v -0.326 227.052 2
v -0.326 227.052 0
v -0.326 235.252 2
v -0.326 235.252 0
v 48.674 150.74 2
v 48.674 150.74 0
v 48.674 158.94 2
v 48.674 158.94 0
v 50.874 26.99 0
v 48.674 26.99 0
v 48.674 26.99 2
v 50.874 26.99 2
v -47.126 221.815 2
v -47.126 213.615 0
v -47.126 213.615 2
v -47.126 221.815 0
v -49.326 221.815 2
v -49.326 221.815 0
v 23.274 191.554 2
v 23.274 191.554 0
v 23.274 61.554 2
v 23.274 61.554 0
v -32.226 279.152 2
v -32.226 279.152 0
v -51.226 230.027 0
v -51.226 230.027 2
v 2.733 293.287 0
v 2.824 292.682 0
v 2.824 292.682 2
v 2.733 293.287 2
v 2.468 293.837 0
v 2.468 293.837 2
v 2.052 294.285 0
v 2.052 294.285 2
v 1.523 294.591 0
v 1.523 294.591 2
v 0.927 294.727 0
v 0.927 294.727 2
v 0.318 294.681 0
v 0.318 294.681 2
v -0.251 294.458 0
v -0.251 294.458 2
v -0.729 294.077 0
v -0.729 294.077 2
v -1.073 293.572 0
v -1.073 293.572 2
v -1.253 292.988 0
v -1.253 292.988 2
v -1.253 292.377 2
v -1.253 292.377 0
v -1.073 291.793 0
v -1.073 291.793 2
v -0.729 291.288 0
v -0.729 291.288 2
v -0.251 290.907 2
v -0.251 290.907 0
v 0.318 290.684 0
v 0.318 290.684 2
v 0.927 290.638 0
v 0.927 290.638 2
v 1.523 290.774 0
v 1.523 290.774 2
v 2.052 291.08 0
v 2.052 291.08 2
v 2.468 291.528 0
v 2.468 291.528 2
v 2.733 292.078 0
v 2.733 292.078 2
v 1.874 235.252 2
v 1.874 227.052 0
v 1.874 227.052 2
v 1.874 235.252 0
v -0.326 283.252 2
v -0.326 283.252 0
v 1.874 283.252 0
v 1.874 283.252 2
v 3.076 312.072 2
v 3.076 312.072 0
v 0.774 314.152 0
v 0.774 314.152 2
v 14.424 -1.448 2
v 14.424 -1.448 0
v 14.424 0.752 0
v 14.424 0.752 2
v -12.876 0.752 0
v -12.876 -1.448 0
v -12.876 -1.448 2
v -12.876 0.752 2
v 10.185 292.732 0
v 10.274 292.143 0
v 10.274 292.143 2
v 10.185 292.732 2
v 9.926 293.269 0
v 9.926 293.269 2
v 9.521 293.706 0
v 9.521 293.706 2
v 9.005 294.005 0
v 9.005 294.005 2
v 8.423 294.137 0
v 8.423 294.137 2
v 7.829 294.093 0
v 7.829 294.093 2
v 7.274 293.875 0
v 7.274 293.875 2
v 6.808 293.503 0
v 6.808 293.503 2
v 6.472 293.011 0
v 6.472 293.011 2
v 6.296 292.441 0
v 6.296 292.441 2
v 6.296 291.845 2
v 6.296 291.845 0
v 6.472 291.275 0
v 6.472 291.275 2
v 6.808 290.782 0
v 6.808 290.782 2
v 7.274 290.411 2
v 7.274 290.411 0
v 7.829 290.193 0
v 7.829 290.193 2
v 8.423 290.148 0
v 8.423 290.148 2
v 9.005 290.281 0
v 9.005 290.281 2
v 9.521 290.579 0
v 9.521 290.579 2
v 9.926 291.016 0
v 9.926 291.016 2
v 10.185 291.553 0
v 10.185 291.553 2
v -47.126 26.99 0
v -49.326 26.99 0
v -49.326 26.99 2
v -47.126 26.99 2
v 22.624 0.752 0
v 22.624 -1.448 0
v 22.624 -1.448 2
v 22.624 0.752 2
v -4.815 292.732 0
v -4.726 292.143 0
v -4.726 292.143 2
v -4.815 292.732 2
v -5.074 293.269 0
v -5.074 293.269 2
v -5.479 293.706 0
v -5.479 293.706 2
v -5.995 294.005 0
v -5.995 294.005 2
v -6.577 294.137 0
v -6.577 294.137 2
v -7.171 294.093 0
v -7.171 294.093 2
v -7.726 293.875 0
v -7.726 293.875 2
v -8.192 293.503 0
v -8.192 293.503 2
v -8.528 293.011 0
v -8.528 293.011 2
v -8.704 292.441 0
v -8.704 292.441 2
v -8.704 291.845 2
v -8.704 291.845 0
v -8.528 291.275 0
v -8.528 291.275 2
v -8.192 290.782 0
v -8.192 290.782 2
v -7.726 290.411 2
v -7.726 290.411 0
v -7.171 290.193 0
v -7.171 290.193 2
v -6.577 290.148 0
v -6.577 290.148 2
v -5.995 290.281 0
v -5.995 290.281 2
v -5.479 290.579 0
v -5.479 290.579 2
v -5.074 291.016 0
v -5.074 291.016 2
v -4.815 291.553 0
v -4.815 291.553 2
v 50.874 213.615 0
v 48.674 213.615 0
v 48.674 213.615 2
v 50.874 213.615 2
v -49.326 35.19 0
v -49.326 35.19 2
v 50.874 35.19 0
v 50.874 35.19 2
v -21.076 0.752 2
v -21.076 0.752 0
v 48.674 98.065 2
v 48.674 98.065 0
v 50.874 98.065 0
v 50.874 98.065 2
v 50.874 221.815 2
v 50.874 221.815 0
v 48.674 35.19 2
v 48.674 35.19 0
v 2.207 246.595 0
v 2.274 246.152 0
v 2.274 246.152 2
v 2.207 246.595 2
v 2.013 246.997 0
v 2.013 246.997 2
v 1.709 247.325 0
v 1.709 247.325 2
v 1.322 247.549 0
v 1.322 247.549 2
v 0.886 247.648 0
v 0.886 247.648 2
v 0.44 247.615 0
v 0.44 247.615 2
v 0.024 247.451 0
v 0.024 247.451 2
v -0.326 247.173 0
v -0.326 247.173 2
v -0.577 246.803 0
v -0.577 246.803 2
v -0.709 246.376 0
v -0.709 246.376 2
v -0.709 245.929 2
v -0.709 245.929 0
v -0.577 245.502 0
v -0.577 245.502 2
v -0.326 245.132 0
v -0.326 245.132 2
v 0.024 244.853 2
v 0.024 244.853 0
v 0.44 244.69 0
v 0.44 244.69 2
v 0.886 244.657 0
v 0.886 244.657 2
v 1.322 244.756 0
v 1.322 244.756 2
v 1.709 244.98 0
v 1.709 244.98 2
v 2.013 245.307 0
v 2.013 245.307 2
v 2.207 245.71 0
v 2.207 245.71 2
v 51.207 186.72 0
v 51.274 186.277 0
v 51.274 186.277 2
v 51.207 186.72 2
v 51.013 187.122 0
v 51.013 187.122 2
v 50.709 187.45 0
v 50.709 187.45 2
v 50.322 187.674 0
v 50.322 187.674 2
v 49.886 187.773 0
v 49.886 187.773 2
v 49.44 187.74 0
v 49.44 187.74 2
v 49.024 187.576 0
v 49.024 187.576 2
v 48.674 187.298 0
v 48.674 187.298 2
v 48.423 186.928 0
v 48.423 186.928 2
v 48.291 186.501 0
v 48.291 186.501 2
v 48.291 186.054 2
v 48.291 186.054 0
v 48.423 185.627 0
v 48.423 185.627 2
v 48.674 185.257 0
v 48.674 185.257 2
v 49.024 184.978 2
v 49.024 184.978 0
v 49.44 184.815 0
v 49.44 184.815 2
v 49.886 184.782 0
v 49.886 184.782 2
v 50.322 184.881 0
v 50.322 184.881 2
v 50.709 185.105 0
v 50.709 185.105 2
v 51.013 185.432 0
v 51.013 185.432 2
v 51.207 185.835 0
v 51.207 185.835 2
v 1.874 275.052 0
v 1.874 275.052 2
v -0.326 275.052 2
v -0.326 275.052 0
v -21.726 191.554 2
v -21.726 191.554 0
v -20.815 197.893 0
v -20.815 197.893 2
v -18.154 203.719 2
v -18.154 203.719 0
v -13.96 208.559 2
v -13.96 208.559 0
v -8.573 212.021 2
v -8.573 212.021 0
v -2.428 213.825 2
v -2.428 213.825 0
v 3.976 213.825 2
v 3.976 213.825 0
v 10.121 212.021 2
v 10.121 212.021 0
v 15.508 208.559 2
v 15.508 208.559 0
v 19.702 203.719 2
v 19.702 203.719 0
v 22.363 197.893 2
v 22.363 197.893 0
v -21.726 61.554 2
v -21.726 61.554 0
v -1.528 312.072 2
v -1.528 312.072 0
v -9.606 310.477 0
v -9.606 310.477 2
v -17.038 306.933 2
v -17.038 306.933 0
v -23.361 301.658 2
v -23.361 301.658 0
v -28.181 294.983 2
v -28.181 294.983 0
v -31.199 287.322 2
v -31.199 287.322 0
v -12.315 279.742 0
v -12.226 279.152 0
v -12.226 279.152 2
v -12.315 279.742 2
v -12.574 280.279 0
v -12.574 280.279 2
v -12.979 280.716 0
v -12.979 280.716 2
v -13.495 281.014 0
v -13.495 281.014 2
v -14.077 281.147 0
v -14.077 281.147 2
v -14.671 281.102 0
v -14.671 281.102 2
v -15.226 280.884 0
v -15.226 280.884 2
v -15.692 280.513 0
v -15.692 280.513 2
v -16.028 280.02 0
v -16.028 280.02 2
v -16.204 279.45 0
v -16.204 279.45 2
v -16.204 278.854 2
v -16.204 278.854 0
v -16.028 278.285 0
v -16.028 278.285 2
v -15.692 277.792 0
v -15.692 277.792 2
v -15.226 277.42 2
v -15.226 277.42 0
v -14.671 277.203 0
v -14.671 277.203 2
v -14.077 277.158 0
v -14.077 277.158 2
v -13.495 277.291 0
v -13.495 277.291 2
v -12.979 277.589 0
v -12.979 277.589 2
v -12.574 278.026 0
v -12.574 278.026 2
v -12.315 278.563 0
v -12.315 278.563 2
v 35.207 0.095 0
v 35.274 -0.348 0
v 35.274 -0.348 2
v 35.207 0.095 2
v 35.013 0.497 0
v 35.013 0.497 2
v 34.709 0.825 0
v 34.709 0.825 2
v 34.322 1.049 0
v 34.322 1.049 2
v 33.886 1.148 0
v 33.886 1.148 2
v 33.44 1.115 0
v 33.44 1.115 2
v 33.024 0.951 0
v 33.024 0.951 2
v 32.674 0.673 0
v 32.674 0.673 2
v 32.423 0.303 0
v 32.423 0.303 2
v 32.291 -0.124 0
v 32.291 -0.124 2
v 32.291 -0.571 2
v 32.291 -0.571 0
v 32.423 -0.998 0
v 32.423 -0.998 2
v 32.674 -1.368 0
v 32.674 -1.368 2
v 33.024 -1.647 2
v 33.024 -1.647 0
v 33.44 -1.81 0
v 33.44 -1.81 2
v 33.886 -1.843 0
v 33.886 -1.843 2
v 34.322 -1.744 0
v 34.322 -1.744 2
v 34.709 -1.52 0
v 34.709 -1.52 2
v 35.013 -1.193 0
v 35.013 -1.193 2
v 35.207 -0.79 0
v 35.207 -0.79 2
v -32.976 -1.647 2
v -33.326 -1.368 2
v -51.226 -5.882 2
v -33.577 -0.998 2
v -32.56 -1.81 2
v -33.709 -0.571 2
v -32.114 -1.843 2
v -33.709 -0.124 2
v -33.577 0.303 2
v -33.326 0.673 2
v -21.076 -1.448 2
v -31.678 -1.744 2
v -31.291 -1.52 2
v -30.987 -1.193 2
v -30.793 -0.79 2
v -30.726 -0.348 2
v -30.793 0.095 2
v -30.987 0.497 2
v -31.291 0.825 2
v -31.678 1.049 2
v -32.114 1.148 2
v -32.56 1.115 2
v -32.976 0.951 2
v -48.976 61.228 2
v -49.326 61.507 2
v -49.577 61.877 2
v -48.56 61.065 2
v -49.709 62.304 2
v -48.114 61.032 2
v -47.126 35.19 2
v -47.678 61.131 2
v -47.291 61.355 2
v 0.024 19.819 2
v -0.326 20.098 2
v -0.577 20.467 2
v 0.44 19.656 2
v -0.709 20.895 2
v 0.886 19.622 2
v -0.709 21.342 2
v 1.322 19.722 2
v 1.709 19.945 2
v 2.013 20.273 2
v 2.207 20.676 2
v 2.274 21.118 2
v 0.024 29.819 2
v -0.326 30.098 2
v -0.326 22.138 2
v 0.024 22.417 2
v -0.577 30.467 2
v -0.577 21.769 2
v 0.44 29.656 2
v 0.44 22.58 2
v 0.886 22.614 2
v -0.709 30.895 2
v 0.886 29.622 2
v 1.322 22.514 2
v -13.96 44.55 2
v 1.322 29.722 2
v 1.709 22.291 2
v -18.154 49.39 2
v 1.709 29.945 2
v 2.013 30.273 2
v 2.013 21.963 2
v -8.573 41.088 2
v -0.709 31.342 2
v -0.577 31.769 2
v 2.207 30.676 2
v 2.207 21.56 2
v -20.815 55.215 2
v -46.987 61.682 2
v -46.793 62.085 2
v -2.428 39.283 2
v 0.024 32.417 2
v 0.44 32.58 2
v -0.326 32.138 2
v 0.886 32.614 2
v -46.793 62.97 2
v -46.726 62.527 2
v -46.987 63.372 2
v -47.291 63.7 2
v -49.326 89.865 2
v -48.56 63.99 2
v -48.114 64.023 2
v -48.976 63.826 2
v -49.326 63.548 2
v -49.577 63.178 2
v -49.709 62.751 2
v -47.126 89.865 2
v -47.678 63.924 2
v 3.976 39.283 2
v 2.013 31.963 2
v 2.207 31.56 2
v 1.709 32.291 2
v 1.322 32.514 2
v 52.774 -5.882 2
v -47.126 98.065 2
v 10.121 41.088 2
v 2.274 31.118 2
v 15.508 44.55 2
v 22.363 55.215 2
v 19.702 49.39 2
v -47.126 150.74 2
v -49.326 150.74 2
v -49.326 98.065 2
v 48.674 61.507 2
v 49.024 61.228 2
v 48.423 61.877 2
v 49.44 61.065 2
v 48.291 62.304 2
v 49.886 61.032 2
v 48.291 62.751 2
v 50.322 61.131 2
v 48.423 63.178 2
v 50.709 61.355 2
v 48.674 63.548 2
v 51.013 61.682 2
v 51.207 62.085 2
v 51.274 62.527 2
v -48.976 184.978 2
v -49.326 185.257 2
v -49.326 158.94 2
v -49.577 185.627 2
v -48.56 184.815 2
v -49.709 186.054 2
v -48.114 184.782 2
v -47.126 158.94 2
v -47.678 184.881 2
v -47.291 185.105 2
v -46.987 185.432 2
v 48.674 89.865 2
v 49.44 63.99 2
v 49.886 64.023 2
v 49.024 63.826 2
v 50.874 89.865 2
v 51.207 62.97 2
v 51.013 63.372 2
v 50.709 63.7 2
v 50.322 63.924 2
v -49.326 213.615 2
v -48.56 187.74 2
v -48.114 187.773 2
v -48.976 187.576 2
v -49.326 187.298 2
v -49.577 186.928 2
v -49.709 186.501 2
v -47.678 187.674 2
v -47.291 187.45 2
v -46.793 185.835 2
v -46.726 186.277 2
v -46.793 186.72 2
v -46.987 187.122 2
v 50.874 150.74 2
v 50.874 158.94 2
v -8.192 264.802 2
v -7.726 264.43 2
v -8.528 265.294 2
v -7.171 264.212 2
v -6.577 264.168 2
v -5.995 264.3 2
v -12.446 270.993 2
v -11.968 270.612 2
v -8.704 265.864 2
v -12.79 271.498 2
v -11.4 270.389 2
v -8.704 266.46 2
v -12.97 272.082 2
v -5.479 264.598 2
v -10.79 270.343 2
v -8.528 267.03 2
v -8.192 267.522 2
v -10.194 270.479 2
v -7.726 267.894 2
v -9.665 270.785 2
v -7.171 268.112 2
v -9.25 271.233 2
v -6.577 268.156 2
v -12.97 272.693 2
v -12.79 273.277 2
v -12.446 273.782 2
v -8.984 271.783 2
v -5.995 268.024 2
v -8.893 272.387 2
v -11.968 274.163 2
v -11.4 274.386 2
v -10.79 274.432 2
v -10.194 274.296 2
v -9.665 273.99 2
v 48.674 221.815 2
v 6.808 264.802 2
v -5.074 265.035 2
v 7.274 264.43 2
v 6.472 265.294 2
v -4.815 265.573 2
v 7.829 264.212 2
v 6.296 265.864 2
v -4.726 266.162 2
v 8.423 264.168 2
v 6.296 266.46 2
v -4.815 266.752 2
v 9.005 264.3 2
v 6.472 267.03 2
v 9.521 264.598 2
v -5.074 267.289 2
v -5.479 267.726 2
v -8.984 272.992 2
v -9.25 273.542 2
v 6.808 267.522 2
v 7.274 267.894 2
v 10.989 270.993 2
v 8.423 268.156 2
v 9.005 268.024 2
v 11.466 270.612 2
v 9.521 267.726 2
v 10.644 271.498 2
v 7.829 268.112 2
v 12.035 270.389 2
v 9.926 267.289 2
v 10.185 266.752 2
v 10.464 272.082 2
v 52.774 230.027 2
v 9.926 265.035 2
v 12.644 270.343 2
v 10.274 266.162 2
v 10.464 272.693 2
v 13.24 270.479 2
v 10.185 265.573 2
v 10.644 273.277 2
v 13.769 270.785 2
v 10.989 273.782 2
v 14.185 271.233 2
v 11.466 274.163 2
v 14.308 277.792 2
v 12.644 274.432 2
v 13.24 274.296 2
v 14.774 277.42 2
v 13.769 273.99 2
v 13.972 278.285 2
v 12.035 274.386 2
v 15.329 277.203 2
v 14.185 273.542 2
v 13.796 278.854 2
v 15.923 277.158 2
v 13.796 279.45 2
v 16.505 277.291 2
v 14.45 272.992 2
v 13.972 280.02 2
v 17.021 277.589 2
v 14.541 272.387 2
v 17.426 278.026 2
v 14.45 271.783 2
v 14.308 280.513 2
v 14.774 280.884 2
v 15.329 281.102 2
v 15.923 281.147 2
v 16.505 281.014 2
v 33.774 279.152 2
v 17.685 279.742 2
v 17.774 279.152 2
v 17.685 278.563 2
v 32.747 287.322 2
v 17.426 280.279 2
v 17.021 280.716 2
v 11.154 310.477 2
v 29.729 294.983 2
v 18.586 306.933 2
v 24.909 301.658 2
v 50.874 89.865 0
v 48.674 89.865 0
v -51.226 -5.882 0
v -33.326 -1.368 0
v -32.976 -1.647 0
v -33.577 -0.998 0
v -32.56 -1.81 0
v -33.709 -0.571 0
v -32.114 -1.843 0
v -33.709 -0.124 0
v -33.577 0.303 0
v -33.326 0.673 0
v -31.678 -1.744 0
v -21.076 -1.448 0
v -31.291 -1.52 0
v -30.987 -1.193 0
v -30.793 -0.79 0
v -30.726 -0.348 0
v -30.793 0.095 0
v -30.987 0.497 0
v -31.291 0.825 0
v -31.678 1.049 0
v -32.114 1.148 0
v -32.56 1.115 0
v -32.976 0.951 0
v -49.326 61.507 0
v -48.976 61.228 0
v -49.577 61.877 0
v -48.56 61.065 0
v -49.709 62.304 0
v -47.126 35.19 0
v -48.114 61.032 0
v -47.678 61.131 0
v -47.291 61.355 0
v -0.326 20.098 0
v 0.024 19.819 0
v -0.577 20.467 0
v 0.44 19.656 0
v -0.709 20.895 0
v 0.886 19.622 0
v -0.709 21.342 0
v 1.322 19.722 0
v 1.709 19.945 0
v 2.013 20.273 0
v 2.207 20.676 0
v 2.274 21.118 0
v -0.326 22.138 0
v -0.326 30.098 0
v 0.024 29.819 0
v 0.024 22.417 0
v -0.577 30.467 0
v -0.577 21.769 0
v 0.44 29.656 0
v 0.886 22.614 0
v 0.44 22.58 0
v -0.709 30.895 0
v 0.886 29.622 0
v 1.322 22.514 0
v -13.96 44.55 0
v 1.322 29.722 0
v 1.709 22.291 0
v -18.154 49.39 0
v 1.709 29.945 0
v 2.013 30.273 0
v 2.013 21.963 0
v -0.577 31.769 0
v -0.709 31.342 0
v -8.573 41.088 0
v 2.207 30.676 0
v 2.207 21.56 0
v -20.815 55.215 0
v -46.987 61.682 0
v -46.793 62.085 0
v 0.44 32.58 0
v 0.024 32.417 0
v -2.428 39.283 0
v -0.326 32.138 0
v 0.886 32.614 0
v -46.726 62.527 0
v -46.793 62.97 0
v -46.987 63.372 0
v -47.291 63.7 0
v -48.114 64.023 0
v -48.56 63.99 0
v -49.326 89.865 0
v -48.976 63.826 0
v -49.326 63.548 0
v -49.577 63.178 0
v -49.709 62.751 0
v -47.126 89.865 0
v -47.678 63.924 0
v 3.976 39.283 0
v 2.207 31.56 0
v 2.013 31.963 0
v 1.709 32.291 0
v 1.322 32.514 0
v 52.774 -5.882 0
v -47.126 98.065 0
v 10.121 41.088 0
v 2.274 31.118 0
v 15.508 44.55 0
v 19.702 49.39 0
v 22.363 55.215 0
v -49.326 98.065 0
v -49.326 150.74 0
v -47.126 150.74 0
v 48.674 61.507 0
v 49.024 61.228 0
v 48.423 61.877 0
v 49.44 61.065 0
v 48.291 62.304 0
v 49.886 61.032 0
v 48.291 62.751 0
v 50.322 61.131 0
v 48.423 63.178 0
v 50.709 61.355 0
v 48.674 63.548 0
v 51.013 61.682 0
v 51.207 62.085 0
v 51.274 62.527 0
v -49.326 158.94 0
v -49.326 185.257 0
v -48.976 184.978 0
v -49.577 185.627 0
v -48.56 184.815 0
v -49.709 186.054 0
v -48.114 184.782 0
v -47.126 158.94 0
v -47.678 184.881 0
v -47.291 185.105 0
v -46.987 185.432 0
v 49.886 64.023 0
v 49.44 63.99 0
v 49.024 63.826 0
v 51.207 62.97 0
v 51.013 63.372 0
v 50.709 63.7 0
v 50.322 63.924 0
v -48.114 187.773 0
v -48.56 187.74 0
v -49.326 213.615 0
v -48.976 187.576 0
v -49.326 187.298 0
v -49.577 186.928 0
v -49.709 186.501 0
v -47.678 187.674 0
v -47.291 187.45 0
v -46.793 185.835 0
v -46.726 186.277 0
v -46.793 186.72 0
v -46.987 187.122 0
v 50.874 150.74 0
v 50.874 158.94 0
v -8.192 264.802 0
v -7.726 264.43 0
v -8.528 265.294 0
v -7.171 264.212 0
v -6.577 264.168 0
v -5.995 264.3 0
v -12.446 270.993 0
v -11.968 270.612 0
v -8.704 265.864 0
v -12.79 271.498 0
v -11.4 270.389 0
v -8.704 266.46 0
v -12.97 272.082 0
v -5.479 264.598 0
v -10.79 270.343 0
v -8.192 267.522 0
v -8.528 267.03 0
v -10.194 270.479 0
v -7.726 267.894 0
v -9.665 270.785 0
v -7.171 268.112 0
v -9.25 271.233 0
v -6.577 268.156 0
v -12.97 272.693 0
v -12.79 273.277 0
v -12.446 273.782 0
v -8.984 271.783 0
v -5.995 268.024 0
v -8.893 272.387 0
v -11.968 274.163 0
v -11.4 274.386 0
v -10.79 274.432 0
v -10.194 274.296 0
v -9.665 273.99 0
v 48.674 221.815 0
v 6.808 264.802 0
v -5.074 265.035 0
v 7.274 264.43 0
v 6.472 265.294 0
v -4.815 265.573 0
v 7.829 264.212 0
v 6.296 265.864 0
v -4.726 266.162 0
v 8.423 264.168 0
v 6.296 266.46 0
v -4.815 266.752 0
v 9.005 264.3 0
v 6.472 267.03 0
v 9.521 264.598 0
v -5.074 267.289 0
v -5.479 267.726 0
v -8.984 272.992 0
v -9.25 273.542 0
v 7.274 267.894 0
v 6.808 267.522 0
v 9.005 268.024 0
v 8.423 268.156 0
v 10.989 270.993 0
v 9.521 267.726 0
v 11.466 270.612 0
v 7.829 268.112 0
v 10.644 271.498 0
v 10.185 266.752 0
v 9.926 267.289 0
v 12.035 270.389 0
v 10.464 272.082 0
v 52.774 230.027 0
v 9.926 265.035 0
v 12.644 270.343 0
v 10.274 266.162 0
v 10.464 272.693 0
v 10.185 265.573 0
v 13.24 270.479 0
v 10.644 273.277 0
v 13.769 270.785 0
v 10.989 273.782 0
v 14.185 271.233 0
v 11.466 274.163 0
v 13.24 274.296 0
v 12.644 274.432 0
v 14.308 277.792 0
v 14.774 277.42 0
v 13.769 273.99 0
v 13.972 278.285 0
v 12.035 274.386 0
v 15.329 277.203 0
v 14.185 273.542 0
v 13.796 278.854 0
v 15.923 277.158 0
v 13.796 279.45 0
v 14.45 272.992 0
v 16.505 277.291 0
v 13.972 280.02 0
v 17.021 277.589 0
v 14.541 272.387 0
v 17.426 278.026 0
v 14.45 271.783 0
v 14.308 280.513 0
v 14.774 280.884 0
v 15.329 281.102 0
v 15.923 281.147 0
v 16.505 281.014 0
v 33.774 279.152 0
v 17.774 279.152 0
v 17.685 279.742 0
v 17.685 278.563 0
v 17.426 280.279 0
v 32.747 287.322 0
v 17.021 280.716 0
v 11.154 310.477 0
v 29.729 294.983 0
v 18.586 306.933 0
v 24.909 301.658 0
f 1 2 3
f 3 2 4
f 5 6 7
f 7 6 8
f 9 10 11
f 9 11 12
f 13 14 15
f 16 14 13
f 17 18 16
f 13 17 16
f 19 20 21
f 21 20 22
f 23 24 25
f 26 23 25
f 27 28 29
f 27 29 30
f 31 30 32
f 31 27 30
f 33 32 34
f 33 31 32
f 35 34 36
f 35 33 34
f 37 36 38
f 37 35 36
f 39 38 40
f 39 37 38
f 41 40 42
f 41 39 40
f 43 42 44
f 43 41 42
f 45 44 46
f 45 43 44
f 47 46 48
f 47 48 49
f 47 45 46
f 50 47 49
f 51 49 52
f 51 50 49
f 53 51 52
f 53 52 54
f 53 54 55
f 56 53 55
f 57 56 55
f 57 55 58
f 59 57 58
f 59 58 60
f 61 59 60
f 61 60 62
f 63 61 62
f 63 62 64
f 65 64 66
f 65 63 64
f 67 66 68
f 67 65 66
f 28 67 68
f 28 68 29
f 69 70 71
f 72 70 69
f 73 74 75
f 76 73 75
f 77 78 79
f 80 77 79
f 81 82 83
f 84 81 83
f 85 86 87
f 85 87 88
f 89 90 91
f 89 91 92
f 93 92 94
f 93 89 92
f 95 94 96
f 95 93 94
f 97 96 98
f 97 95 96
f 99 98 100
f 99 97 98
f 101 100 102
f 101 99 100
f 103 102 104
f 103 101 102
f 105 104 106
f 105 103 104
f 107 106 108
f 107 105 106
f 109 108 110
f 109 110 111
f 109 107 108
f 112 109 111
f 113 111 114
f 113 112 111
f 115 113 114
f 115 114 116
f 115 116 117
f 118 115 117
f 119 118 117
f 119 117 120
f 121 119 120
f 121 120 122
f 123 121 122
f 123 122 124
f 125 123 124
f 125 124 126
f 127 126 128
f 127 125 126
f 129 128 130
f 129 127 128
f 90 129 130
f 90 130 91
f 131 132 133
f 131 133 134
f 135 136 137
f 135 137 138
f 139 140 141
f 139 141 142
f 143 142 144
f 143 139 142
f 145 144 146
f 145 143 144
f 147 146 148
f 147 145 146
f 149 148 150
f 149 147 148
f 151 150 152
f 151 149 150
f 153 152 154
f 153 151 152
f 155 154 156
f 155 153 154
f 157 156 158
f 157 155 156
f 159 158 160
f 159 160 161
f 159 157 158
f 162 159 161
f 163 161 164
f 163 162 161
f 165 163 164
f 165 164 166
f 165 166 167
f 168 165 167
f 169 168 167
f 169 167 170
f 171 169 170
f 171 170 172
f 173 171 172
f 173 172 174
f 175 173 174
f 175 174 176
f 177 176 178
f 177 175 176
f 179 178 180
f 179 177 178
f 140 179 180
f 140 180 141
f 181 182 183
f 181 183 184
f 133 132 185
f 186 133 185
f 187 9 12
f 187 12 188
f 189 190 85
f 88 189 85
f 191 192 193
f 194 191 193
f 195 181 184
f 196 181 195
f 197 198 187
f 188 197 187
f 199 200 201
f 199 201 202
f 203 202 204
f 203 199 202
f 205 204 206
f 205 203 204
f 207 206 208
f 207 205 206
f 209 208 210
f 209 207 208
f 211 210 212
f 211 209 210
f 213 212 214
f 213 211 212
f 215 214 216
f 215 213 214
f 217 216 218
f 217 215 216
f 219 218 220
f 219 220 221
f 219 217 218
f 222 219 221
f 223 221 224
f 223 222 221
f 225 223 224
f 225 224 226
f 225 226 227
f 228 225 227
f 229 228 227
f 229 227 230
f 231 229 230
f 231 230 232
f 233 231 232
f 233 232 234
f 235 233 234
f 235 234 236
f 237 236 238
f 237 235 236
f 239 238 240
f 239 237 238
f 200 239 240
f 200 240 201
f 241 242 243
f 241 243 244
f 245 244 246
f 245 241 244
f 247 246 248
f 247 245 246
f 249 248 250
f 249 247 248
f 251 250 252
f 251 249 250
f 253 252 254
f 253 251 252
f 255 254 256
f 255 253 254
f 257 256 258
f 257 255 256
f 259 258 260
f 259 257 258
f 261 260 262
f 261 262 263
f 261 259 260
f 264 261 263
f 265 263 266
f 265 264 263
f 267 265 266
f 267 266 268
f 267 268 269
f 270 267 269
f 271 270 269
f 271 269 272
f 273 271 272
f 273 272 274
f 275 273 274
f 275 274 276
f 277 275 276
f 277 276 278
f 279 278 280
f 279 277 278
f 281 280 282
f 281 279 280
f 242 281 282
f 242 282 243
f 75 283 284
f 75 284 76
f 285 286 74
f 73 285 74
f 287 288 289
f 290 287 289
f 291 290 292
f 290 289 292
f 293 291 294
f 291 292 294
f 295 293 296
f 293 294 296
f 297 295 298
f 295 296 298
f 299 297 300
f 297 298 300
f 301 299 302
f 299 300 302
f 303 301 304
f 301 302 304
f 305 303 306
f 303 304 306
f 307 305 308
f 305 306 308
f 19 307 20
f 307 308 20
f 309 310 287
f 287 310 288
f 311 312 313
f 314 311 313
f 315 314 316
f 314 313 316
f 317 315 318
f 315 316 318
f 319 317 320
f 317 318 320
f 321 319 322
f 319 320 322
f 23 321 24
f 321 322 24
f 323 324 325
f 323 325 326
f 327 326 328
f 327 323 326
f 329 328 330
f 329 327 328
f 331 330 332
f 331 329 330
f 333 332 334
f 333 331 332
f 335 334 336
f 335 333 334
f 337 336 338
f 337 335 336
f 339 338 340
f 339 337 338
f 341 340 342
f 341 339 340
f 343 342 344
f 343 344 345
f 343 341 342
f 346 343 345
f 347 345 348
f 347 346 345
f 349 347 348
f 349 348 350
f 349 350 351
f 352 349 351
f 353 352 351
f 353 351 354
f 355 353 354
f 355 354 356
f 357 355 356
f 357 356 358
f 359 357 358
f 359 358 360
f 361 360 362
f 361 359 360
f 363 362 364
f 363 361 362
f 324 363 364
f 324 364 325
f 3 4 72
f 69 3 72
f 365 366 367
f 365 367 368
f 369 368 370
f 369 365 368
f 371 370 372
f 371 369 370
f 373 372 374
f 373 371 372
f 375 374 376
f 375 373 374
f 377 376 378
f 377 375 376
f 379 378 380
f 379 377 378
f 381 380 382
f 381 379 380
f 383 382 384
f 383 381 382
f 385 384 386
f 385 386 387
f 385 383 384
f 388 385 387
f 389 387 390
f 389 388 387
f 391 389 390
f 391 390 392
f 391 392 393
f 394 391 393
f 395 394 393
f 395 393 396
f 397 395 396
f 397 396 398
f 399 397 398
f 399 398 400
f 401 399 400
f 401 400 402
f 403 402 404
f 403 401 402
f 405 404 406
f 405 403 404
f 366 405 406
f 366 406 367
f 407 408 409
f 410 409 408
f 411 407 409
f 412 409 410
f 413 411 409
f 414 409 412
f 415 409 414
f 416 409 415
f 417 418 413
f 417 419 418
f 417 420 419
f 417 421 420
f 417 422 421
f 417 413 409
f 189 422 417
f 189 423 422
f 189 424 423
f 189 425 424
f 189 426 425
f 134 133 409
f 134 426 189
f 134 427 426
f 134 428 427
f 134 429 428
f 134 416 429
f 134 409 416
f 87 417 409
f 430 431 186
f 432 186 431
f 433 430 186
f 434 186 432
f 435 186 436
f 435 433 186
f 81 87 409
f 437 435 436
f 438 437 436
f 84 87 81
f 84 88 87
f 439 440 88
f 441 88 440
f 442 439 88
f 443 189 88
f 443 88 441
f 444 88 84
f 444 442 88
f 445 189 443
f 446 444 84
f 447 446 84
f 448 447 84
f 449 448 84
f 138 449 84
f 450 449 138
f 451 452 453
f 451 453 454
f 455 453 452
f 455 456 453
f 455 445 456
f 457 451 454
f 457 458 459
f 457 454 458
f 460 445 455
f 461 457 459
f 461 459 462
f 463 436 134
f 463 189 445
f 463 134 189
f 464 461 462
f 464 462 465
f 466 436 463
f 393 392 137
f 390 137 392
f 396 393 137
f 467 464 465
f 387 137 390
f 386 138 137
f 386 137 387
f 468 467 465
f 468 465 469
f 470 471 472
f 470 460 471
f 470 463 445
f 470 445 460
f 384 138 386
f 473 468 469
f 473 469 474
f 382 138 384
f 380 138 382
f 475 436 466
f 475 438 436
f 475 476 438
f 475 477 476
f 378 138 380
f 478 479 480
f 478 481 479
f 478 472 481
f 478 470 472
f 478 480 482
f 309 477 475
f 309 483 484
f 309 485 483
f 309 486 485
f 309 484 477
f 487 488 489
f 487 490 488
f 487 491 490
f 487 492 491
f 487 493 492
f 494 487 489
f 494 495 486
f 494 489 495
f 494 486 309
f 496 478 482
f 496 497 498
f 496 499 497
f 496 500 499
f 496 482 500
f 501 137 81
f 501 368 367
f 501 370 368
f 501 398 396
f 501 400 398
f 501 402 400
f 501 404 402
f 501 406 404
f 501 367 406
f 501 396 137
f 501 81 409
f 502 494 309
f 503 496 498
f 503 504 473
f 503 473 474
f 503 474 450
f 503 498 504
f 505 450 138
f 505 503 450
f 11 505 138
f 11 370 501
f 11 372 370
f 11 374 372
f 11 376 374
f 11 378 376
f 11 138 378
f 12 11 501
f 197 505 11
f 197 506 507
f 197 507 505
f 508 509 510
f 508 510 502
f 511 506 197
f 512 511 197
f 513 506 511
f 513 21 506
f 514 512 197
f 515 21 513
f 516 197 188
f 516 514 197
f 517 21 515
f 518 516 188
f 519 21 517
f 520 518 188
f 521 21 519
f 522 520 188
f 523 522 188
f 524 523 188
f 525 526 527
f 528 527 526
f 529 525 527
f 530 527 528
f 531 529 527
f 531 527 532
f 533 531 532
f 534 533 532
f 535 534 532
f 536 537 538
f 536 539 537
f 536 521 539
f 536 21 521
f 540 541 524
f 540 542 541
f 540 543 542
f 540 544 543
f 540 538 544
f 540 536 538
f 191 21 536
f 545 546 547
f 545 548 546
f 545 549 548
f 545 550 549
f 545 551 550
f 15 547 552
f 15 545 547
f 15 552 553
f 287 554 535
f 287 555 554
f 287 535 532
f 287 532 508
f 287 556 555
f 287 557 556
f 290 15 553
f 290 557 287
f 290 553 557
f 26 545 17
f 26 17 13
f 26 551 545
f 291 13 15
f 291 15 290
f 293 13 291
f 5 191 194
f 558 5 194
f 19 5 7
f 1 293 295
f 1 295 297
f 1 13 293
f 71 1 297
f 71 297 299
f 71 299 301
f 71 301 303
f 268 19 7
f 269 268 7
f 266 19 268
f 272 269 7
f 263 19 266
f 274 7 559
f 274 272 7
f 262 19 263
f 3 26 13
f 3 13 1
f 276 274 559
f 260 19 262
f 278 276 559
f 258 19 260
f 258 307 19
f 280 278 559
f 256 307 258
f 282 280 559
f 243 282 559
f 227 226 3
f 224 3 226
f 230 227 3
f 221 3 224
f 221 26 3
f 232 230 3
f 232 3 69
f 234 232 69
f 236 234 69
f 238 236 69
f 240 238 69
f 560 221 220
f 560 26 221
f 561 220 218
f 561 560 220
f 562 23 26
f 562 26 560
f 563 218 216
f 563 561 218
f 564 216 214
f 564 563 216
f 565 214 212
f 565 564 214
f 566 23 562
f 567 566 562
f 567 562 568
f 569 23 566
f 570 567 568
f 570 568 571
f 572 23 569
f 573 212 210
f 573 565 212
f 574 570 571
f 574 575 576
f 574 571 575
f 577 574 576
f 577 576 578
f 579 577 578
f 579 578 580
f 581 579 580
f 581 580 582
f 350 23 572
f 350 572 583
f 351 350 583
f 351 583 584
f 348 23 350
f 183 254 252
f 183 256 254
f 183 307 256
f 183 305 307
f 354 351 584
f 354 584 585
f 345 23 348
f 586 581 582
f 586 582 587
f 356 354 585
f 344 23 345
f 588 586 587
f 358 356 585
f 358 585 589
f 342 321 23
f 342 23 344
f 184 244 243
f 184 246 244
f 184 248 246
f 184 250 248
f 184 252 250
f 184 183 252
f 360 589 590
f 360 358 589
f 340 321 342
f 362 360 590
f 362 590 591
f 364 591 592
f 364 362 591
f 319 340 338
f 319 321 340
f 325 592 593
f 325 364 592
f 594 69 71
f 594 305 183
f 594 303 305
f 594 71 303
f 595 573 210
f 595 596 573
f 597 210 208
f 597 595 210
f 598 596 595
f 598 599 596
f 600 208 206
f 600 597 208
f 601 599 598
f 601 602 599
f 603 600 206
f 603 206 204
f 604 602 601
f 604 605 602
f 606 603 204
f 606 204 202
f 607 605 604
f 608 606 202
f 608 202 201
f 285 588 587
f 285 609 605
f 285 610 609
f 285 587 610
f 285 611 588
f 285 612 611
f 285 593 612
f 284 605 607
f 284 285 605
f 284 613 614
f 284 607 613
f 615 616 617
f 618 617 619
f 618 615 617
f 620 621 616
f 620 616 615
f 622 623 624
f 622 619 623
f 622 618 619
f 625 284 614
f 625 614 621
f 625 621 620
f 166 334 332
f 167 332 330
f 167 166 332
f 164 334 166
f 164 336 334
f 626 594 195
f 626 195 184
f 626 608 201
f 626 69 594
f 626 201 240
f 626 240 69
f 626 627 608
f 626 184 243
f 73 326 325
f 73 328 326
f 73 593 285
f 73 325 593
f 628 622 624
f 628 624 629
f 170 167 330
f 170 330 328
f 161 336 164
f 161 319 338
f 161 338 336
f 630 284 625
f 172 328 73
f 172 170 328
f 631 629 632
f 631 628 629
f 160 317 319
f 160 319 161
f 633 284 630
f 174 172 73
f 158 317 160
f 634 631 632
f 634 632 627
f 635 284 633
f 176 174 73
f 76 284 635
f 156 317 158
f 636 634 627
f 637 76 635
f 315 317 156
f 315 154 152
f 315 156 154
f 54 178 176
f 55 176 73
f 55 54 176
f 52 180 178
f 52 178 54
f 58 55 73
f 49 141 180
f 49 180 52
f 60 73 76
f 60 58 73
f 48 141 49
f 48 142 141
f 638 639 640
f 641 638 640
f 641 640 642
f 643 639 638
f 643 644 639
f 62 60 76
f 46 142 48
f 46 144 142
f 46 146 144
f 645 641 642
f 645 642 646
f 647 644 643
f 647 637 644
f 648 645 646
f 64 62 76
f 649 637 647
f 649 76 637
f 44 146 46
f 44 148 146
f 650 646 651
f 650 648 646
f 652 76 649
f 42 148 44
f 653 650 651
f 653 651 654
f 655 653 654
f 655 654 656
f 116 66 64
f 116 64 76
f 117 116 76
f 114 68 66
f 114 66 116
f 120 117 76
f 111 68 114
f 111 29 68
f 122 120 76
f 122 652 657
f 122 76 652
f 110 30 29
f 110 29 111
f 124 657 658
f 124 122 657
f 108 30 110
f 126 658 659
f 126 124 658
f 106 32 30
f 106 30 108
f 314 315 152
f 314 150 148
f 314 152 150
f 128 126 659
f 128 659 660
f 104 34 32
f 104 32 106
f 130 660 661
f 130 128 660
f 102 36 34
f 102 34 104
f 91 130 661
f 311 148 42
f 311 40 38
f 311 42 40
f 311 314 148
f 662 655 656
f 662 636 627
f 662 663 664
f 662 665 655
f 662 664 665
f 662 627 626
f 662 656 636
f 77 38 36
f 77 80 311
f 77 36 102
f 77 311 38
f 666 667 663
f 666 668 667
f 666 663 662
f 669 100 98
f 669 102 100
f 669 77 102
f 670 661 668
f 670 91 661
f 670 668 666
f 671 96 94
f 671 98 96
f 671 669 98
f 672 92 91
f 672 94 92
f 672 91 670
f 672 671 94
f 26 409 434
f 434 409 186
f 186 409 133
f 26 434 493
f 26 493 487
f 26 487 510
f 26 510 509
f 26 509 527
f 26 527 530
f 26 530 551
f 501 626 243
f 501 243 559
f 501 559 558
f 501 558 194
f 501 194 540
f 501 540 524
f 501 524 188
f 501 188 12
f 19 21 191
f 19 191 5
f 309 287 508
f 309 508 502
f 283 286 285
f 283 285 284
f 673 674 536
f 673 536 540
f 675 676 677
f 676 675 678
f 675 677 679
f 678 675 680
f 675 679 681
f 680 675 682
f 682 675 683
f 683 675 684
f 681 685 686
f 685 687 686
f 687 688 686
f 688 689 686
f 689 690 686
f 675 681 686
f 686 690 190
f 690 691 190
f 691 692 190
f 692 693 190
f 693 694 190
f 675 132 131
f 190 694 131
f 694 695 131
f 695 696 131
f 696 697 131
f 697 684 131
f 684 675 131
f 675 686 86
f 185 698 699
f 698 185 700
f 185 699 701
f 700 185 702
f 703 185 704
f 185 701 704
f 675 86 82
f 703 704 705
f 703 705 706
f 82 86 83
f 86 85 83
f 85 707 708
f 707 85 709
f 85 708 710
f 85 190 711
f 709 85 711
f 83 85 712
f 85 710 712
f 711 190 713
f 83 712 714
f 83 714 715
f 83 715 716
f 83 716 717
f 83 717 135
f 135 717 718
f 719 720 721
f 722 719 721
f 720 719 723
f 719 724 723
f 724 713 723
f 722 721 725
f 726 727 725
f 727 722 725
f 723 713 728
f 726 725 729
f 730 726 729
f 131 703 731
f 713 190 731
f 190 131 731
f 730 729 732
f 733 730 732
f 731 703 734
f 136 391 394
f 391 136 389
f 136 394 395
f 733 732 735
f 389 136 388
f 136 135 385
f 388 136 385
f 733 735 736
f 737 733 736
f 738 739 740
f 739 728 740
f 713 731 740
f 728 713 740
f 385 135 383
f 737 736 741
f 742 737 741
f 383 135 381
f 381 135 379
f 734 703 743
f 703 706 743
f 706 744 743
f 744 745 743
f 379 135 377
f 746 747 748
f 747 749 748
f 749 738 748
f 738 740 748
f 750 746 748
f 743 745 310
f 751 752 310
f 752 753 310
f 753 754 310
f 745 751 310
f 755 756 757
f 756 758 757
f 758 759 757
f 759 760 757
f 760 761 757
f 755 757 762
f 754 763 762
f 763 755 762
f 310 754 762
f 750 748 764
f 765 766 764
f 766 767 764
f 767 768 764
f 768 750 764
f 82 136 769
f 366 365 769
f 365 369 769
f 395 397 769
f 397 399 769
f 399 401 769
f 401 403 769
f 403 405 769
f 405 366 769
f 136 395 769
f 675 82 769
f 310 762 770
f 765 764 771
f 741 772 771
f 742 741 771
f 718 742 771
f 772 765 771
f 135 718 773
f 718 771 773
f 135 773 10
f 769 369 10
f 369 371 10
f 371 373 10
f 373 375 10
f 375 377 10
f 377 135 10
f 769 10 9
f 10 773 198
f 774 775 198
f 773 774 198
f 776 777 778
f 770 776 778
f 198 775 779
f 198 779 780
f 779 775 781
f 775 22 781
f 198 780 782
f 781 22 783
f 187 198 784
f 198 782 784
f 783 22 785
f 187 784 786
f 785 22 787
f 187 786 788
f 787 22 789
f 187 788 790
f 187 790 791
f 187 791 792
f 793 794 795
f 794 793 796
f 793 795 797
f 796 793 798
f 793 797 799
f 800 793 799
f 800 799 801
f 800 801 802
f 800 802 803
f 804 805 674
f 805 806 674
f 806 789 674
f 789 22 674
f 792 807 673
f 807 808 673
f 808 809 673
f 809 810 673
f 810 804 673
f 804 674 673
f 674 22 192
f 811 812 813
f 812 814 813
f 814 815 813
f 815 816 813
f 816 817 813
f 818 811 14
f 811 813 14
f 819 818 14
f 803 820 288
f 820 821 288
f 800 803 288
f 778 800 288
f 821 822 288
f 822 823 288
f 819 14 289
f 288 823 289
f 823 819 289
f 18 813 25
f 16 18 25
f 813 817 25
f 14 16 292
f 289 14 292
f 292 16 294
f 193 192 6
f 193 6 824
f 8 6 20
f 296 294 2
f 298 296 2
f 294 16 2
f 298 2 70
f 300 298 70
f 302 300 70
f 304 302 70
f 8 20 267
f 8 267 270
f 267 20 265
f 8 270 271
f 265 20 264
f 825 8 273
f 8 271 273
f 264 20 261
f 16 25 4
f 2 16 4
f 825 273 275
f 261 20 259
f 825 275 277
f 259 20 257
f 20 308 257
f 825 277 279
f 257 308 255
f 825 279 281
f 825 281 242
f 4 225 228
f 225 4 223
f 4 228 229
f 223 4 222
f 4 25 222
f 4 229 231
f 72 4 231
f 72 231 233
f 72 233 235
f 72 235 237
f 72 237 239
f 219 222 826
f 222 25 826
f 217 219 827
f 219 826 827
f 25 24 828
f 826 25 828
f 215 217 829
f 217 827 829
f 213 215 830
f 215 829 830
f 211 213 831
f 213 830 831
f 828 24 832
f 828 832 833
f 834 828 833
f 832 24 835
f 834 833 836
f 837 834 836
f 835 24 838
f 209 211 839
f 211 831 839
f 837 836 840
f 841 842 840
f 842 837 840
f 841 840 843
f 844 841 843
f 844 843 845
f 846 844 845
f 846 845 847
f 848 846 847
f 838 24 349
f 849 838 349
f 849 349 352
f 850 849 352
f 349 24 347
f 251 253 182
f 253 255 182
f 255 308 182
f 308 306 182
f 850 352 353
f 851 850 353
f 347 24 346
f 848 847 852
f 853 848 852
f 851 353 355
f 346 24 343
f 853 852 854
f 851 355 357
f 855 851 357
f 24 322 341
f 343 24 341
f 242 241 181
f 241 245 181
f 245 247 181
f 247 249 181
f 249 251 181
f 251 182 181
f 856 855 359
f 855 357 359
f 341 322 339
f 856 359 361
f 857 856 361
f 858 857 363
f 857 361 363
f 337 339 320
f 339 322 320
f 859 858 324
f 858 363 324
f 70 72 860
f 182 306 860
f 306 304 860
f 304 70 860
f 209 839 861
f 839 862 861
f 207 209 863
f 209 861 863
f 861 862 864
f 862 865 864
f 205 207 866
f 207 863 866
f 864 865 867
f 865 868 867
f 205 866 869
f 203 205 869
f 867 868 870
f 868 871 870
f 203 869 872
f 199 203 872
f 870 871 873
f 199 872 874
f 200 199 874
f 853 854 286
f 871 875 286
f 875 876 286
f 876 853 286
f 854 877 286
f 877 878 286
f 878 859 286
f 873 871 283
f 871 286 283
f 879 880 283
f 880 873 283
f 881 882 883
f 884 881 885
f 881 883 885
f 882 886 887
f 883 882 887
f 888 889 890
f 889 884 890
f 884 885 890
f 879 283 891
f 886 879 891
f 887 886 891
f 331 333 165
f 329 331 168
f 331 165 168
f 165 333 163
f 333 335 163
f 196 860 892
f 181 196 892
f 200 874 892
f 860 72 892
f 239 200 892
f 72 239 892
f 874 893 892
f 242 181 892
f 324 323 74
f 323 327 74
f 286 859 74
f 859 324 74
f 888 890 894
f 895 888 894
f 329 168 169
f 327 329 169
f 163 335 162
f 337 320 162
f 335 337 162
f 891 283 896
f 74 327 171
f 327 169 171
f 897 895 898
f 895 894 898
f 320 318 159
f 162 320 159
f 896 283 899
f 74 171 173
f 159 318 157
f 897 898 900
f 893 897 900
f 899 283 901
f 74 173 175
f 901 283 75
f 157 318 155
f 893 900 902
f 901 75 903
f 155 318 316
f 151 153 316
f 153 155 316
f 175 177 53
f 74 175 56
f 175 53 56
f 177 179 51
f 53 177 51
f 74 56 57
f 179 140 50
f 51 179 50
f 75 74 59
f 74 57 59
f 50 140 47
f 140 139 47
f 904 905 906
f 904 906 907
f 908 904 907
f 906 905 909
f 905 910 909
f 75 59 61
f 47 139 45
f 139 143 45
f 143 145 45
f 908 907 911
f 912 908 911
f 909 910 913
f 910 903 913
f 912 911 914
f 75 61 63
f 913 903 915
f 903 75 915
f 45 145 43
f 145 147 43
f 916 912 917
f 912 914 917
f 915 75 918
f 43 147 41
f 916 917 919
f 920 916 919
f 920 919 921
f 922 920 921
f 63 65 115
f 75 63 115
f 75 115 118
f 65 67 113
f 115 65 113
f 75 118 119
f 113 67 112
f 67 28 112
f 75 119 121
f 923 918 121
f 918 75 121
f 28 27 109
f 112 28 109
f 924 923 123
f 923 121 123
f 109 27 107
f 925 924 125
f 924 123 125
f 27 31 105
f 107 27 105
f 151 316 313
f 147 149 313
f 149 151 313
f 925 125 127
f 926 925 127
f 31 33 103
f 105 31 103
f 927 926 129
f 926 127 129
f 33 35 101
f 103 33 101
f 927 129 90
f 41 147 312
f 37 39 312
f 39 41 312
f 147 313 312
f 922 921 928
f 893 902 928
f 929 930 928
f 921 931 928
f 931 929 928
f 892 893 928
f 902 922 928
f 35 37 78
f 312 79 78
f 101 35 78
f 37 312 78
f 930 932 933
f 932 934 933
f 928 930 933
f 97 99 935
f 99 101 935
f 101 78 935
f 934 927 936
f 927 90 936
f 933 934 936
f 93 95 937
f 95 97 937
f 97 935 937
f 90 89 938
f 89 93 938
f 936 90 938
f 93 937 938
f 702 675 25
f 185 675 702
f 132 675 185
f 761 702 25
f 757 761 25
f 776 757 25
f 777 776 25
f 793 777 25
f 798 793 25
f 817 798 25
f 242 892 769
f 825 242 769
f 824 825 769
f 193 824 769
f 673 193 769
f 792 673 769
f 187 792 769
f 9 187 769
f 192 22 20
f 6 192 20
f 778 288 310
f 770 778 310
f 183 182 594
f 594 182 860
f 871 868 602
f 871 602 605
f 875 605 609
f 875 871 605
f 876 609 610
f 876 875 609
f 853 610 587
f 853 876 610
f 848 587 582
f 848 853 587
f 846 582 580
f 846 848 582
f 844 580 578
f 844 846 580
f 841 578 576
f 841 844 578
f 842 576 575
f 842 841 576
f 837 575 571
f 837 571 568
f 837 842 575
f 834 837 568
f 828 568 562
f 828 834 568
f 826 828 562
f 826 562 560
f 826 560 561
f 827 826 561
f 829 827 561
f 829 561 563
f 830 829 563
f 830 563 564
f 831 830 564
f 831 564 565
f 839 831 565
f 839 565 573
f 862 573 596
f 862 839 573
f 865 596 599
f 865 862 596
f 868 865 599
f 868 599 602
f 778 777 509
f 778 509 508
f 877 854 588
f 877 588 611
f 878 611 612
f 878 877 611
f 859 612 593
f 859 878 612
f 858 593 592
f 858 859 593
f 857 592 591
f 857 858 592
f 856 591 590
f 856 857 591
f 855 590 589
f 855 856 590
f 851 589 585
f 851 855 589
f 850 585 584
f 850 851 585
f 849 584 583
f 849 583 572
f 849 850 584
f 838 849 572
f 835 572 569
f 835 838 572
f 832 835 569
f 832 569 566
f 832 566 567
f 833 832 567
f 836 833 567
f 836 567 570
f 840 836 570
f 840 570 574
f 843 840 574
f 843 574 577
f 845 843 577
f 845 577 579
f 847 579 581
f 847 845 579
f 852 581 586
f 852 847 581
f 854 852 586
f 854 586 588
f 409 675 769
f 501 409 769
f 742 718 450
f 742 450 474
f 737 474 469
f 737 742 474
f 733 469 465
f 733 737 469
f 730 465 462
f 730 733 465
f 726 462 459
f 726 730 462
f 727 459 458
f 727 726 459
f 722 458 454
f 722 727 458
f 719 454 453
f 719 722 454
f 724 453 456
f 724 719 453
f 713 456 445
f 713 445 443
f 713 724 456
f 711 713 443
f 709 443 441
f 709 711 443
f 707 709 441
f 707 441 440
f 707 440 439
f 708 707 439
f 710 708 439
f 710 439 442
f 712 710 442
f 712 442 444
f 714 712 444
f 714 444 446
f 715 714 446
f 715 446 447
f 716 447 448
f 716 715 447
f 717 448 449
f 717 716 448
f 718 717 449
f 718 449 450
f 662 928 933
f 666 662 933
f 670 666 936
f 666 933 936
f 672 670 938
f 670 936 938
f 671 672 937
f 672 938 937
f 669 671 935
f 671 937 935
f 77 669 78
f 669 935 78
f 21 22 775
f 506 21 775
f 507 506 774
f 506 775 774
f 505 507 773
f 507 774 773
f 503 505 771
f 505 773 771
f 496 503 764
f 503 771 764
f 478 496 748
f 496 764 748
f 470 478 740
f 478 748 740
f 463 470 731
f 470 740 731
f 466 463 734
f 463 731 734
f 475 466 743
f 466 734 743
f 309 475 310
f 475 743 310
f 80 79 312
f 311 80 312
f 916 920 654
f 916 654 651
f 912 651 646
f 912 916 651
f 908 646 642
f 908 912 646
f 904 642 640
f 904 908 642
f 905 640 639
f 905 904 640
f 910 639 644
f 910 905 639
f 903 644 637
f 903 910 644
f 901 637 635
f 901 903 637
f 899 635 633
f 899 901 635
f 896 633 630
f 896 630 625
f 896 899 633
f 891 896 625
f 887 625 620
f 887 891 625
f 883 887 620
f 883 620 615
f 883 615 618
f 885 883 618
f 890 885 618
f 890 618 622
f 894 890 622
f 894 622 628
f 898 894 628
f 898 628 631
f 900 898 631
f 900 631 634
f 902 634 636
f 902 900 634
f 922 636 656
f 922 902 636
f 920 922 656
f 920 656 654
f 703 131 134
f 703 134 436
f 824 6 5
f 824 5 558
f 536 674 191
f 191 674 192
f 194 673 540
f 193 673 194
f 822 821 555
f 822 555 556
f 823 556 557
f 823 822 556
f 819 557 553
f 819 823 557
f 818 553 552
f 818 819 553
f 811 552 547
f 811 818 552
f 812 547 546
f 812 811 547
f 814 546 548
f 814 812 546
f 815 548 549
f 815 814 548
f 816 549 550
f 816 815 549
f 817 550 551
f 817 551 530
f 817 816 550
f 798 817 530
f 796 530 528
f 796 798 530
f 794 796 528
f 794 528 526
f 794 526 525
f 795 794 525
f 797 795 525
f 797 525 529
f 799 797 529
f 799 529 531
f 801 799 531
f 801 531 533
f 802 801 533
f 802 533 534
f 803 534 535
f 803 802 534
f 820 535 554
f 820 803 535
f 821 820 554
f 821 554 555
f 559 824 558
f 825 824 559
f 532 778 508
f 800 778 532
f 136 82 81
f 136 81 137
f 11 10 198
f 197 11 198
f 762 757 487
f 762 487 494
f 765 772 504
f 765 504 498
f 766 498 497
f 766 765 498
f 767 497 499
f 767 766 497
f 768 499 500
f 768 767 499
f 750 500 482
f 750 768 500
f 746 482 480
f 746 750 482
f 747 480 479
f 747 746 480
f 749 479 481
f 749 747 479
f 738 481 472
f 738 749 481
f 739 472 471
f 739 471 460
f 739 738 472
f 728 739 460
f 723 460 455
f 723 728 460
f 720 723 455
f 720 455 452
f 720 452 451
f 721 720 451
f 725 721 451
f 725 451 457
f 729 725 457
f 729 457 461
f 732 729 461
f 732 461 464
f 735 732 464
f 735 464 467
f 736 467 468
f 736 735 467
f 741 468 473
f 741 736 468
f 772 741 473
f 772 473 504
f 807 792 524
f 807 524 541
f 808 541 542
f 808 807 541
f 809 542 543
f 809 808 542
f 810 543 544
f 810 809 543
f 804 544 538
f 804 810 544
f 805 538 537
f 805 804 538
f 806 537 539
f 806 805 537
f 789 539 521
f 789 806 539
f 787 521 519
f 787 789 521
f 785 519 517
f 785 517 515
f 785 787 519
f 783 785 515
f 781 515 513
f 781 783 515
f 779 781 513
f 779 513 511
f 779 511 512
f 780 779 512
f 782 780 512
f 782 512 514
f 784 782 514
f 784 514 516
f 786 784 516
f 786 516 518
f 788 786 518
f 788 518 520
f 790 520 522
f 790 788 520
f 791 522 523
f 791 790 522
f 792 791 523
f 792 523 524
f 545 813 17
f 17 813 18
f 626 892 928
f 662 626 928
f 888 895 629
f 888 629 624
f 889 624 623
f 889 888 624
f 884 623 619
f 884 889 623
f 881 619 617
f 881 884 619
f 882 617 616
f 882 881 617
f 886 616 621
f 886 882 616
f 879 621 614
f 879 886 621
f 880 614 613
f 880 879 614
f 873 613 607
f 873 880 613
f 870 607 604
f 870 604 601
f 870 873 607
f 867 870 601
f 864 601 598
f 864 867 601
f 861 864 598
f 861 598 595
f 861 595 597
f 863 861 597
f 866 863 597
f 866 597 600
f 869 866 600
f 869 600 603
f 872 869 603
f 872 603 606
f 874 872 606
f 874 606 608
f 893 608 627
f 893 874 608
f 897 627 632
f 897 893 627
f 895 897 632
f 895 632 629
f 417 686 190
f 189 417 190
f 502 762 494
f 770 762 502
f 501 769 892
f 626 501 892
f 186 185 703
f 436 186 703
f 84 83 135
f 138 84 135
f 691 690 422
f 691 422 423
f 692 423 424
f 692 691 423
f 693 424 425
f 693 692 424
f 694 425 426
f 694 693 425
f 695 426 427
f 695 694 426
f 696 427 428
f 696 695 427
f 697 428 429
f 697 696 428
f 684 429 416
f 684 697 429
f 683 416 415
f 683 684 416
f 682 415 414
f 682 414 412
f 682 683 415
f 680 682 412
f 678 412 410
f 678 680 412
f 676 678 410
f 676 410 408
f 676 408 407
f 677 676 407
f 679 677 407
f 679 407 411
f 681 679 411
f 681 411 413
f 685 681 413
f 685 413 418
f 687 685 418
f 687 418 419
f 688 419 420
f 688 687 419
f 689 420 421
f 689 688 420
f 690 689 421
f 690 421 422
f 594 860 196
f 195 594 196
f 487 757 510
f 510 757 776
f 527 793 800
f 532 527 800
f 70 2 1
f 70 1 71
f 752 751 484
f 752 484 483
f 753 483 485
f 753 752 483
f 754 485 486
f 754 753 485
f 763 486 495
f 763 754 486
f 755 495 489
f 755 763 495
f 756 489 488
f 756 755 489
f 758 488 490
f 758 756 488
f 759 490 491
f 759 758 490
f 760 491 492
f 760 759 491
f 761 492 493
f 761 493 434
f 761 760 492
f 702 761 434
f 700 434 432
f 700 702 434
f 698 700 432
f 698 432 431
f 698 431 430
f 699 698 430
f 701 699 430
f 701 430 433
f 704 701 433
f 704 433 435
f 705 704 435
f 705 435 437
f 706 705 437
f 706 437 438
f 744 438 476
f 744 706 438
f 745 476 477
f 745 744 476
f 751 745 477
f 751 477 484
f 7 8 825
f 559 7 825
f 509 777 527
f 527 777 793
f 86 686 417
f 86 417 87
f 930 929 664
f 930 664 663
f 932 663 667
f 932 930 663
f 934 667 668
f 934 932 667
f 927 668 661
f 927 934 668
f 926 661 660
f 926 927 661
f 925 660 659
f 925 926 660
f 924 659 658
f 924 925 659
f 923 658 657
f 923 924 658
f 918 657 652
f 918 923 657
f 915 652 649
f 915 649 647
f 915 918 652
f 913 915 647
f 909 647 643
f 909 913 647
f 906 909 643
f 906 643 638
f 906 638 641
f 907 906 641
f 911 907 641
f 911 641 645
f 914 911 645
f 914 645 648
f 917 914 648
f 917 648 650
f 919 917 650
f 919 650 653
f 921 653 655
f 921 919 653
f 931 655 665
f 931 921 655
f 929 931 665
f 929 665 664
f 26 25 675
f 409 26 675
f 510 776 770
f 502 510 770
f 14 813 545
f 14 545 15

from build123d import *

# Parameters (mm, degrees)
SKETCH_1_R      = 1.5
SKETCH_1_R_2    = 2
SKETCH_1_R_3    = 2.05
SKETCH_1_W      = 8.2
SKETCH_1_H      = 2.2
SKETCH_1_W_2    = 2.2
SKETCH_1_H_2    = 8.2
EXTRUDE_1_DEPTH = 2


with BuildPart() as part:
    # 草图1 → 凸台-拉伸1 (new body)
    with BuildSketch(Plane.XY):
        with BuildLine():
            Line((-51.22603831, 230.027402263), (-51.22603831, 124.402402263))
            Line((-51.22603831, 124.402402263), (-51.22603831, 0.652402263))
            Line((-51.22603831, 0.652402263), (-51.22603831, -5.881910062))
            Line((-51.22603831, -5.881910062), (-17.97603831, -5.881910062))
            Line((-17.97603831, -5.881910062), (19.52396169, -5.881910062))
            Line((19.52396169, -5.881910062), (52.77396169, -5.881910062))
            Line((52.77396169, -5.881910062), (52.77396169, 0.652402263))
            Line((52.77396169, 0.652402263), (52.77396169, 124.402402263))
            Line((52.77396169, 124.402402263), (52.77396169, 230.027402263))
            Line((52.77396169, 230.027402263), (33.77396169, 279.152402263))
            ThreePointArc((33.77396169, 279.152402263), (24.908633844, 301.658348145), (3.075925324, 312.072015922))
            Line((3.075925324, 312.072015922), (0.77396169, 314.152402263))
            Line((0.77396169, 314.152402263), (-1.528001943, 312.072015922))
            ThreePointArc((-1.528001943, 312.072015922), (-23.360710463, 301.658348145), (-32.22603831, 279.152402263))
            Line((-32.22603831, 279.152402263), (-51.22603831, 230.027402263))
        make_face()
        with Locations((-32.22603831, -0.347597737)):
            Circle(SKETCH_1_R, mode=Mode.SUBTRACT)
        with Locations((-48.22603831, 62.527402263)):
            Circle(SKETCH_1_R, mode=Mode.SUBTRACT)
        with Locations((-48.22603831, 186.277402263)):
            Circle(SKETCH_1_R, mode=Mode.SUBTRACT)
        with Locations((33.77396169, -0.347597737)):
            Circle(SKETCH_1_R, mode=Mode.SUBTRACT)
        with Locations((49.77396169, 62.527402263)):
            Circle(SKETCH_1_R, mode=Mode.SUBTRACT)
        with Locations((49.77396169, 186.277402263)):
            Circle(SKETCH_1_R, mode=Mode.SUBTRACT)
        with Locations((0.77396169, 21.118089938)):
            Circle(SKETCH_1_R, mode=Mode.SUBTRACT)
        with Locations((0.77396169, 31.118089938)):
            Circle(SKETCH_1_R, mode=Mode.SUBTRACT)
        with Locations((-14.22603831, 279.152402263)):
            Circle(SKETCH_1_R_2, mode=Mode.SUBTRACT)
        with Locations((-6.72603831, 292.14278332)):
            Circle(SKETCH_1_R_2, mode=Mode.SUBTRACT)
        with Locations((8.27396169, 292.14278332)):
            Circle(SKETCH_1_R_2, mode=Mode.SUBTRACT)
        with Locations((15.77396169, 279.152402263)):
            Circle(SKETCH_1_R_2, mode=Mode.SUBTRACT)
        with Locations((8.27396169, 266.162021207)):
            Circle(SKETCH_1_R_2, mode=Mode.SUBTRACT)
        with Locations((-6.72603831, 266.162021207)):
            Circle(SKETCH_1_R_2, mode=Mode.SUBTRACT)
        with Locations((0.77396169, 292.682402263)):
            Circle(SKETCH_1_R_3, mode=Mode.SUBTRACT)
        with Locations((12.491285404, 272.387402263)):
            Circle(SKETCH_1_R_3, mode=Mode.SUBTRACT)
        with Locations((-10.943362023, 272.387402263)):
            Circle(SKETCH_1_R_3, mode=Mode.SUBTRACT)
        with Locations((0.77396169, 246.152402263)):
            Circle(SKETCH_1_R, mode=Mode.SUBTRACT)
        with Locations((-16.97603831, -0.347597737)):
            Rectangle(SKETCH_1_W, SKETCH_1_H, mode=Mode.SUBTRACT)
        with Locations((18.52396169, -0.347597737)):
            Rectangle(SKETCH_1_W, SKETCH_1_H, mode=Mode.SUBTRACT)
        with BuildLine():
            Line((23.27396169, 191.554247886), (23.27396169, 61.554247886))
            ThreePointArc((23.27396169, 61.554247886), (0.77396169, 39.054247886), (-21.72603831, 61.554247886))
            Line((-21.72603831, 61.554247886), (-21.72603831, 191.554247886))
            ThreePointArc((-21.72603831, 191.554247886), (0.77396169, 214.054247886), (23.27396169, 191.554247886))
        make_face(mode=Mode.SUBTRACT)
        with Locations((-48.22603831, 217.714902263)):
            Rectangle(SKETCH_1_W_2, SKETCH_1_H_2, mode=Mode.SUBTRACT)
        with Locations((-48.22603831, 154.839902263)):
            Rectangle(SKETCH_1_W_2, SKETCH_1_H_2, mode=Mode.SUBTRACT)
        with Locations((-48.22603831, 93.964902263)):
            Rectangle(SKETCH_1_W_2, SKETCH_1_H_2, mode=Mode.SUBTRACT)
        with Locations((-48.22603831, 31.089902263)):
            Rectangle(SKETCH_1_W_2, SKETCH_1_H_2, mode=Mode.SUBTRACT)
        with Locations((49.77396169, 31.089902263)):
            Rectangle(SKETCH_1_W_2, SKETCH_1_H_2, mode=Mode.SUBTRACT)
        with Locations((49.77396169, 93.964902263)):
            Rectangle(SKETCH_1_W_2, SKETCH_1_H_2, mode=Mode.SUBTRACT)
        with Locations((49.77396169, 154.839902263)):
            Rectangle(SKETCH_1_W_2, SKETCH_1_H_2, mode=Mode.SUBTRACT)
        with Locations((49.77396169, 217.714902263)):
            Rectangle(SKETCH_1_W_2, SKETCH_1_H_2, mode=Mode.SUBTRACT)
        with Locations((0.77396169, 231.152402263)):
            Rectangle(SKETCH_1_W_2, SKETCH_1_H_2, mode=Mode.SUBTRACT)
        with Locations((0.77396169, 279.152402263)):
            Rectangle(SKETCH_1_W_2, SKETCH_1_H_2, mode=Mode.SUBTRACT)
    extrude(amount=EXTRUDE_1_DEPTH)


solid = part.part
